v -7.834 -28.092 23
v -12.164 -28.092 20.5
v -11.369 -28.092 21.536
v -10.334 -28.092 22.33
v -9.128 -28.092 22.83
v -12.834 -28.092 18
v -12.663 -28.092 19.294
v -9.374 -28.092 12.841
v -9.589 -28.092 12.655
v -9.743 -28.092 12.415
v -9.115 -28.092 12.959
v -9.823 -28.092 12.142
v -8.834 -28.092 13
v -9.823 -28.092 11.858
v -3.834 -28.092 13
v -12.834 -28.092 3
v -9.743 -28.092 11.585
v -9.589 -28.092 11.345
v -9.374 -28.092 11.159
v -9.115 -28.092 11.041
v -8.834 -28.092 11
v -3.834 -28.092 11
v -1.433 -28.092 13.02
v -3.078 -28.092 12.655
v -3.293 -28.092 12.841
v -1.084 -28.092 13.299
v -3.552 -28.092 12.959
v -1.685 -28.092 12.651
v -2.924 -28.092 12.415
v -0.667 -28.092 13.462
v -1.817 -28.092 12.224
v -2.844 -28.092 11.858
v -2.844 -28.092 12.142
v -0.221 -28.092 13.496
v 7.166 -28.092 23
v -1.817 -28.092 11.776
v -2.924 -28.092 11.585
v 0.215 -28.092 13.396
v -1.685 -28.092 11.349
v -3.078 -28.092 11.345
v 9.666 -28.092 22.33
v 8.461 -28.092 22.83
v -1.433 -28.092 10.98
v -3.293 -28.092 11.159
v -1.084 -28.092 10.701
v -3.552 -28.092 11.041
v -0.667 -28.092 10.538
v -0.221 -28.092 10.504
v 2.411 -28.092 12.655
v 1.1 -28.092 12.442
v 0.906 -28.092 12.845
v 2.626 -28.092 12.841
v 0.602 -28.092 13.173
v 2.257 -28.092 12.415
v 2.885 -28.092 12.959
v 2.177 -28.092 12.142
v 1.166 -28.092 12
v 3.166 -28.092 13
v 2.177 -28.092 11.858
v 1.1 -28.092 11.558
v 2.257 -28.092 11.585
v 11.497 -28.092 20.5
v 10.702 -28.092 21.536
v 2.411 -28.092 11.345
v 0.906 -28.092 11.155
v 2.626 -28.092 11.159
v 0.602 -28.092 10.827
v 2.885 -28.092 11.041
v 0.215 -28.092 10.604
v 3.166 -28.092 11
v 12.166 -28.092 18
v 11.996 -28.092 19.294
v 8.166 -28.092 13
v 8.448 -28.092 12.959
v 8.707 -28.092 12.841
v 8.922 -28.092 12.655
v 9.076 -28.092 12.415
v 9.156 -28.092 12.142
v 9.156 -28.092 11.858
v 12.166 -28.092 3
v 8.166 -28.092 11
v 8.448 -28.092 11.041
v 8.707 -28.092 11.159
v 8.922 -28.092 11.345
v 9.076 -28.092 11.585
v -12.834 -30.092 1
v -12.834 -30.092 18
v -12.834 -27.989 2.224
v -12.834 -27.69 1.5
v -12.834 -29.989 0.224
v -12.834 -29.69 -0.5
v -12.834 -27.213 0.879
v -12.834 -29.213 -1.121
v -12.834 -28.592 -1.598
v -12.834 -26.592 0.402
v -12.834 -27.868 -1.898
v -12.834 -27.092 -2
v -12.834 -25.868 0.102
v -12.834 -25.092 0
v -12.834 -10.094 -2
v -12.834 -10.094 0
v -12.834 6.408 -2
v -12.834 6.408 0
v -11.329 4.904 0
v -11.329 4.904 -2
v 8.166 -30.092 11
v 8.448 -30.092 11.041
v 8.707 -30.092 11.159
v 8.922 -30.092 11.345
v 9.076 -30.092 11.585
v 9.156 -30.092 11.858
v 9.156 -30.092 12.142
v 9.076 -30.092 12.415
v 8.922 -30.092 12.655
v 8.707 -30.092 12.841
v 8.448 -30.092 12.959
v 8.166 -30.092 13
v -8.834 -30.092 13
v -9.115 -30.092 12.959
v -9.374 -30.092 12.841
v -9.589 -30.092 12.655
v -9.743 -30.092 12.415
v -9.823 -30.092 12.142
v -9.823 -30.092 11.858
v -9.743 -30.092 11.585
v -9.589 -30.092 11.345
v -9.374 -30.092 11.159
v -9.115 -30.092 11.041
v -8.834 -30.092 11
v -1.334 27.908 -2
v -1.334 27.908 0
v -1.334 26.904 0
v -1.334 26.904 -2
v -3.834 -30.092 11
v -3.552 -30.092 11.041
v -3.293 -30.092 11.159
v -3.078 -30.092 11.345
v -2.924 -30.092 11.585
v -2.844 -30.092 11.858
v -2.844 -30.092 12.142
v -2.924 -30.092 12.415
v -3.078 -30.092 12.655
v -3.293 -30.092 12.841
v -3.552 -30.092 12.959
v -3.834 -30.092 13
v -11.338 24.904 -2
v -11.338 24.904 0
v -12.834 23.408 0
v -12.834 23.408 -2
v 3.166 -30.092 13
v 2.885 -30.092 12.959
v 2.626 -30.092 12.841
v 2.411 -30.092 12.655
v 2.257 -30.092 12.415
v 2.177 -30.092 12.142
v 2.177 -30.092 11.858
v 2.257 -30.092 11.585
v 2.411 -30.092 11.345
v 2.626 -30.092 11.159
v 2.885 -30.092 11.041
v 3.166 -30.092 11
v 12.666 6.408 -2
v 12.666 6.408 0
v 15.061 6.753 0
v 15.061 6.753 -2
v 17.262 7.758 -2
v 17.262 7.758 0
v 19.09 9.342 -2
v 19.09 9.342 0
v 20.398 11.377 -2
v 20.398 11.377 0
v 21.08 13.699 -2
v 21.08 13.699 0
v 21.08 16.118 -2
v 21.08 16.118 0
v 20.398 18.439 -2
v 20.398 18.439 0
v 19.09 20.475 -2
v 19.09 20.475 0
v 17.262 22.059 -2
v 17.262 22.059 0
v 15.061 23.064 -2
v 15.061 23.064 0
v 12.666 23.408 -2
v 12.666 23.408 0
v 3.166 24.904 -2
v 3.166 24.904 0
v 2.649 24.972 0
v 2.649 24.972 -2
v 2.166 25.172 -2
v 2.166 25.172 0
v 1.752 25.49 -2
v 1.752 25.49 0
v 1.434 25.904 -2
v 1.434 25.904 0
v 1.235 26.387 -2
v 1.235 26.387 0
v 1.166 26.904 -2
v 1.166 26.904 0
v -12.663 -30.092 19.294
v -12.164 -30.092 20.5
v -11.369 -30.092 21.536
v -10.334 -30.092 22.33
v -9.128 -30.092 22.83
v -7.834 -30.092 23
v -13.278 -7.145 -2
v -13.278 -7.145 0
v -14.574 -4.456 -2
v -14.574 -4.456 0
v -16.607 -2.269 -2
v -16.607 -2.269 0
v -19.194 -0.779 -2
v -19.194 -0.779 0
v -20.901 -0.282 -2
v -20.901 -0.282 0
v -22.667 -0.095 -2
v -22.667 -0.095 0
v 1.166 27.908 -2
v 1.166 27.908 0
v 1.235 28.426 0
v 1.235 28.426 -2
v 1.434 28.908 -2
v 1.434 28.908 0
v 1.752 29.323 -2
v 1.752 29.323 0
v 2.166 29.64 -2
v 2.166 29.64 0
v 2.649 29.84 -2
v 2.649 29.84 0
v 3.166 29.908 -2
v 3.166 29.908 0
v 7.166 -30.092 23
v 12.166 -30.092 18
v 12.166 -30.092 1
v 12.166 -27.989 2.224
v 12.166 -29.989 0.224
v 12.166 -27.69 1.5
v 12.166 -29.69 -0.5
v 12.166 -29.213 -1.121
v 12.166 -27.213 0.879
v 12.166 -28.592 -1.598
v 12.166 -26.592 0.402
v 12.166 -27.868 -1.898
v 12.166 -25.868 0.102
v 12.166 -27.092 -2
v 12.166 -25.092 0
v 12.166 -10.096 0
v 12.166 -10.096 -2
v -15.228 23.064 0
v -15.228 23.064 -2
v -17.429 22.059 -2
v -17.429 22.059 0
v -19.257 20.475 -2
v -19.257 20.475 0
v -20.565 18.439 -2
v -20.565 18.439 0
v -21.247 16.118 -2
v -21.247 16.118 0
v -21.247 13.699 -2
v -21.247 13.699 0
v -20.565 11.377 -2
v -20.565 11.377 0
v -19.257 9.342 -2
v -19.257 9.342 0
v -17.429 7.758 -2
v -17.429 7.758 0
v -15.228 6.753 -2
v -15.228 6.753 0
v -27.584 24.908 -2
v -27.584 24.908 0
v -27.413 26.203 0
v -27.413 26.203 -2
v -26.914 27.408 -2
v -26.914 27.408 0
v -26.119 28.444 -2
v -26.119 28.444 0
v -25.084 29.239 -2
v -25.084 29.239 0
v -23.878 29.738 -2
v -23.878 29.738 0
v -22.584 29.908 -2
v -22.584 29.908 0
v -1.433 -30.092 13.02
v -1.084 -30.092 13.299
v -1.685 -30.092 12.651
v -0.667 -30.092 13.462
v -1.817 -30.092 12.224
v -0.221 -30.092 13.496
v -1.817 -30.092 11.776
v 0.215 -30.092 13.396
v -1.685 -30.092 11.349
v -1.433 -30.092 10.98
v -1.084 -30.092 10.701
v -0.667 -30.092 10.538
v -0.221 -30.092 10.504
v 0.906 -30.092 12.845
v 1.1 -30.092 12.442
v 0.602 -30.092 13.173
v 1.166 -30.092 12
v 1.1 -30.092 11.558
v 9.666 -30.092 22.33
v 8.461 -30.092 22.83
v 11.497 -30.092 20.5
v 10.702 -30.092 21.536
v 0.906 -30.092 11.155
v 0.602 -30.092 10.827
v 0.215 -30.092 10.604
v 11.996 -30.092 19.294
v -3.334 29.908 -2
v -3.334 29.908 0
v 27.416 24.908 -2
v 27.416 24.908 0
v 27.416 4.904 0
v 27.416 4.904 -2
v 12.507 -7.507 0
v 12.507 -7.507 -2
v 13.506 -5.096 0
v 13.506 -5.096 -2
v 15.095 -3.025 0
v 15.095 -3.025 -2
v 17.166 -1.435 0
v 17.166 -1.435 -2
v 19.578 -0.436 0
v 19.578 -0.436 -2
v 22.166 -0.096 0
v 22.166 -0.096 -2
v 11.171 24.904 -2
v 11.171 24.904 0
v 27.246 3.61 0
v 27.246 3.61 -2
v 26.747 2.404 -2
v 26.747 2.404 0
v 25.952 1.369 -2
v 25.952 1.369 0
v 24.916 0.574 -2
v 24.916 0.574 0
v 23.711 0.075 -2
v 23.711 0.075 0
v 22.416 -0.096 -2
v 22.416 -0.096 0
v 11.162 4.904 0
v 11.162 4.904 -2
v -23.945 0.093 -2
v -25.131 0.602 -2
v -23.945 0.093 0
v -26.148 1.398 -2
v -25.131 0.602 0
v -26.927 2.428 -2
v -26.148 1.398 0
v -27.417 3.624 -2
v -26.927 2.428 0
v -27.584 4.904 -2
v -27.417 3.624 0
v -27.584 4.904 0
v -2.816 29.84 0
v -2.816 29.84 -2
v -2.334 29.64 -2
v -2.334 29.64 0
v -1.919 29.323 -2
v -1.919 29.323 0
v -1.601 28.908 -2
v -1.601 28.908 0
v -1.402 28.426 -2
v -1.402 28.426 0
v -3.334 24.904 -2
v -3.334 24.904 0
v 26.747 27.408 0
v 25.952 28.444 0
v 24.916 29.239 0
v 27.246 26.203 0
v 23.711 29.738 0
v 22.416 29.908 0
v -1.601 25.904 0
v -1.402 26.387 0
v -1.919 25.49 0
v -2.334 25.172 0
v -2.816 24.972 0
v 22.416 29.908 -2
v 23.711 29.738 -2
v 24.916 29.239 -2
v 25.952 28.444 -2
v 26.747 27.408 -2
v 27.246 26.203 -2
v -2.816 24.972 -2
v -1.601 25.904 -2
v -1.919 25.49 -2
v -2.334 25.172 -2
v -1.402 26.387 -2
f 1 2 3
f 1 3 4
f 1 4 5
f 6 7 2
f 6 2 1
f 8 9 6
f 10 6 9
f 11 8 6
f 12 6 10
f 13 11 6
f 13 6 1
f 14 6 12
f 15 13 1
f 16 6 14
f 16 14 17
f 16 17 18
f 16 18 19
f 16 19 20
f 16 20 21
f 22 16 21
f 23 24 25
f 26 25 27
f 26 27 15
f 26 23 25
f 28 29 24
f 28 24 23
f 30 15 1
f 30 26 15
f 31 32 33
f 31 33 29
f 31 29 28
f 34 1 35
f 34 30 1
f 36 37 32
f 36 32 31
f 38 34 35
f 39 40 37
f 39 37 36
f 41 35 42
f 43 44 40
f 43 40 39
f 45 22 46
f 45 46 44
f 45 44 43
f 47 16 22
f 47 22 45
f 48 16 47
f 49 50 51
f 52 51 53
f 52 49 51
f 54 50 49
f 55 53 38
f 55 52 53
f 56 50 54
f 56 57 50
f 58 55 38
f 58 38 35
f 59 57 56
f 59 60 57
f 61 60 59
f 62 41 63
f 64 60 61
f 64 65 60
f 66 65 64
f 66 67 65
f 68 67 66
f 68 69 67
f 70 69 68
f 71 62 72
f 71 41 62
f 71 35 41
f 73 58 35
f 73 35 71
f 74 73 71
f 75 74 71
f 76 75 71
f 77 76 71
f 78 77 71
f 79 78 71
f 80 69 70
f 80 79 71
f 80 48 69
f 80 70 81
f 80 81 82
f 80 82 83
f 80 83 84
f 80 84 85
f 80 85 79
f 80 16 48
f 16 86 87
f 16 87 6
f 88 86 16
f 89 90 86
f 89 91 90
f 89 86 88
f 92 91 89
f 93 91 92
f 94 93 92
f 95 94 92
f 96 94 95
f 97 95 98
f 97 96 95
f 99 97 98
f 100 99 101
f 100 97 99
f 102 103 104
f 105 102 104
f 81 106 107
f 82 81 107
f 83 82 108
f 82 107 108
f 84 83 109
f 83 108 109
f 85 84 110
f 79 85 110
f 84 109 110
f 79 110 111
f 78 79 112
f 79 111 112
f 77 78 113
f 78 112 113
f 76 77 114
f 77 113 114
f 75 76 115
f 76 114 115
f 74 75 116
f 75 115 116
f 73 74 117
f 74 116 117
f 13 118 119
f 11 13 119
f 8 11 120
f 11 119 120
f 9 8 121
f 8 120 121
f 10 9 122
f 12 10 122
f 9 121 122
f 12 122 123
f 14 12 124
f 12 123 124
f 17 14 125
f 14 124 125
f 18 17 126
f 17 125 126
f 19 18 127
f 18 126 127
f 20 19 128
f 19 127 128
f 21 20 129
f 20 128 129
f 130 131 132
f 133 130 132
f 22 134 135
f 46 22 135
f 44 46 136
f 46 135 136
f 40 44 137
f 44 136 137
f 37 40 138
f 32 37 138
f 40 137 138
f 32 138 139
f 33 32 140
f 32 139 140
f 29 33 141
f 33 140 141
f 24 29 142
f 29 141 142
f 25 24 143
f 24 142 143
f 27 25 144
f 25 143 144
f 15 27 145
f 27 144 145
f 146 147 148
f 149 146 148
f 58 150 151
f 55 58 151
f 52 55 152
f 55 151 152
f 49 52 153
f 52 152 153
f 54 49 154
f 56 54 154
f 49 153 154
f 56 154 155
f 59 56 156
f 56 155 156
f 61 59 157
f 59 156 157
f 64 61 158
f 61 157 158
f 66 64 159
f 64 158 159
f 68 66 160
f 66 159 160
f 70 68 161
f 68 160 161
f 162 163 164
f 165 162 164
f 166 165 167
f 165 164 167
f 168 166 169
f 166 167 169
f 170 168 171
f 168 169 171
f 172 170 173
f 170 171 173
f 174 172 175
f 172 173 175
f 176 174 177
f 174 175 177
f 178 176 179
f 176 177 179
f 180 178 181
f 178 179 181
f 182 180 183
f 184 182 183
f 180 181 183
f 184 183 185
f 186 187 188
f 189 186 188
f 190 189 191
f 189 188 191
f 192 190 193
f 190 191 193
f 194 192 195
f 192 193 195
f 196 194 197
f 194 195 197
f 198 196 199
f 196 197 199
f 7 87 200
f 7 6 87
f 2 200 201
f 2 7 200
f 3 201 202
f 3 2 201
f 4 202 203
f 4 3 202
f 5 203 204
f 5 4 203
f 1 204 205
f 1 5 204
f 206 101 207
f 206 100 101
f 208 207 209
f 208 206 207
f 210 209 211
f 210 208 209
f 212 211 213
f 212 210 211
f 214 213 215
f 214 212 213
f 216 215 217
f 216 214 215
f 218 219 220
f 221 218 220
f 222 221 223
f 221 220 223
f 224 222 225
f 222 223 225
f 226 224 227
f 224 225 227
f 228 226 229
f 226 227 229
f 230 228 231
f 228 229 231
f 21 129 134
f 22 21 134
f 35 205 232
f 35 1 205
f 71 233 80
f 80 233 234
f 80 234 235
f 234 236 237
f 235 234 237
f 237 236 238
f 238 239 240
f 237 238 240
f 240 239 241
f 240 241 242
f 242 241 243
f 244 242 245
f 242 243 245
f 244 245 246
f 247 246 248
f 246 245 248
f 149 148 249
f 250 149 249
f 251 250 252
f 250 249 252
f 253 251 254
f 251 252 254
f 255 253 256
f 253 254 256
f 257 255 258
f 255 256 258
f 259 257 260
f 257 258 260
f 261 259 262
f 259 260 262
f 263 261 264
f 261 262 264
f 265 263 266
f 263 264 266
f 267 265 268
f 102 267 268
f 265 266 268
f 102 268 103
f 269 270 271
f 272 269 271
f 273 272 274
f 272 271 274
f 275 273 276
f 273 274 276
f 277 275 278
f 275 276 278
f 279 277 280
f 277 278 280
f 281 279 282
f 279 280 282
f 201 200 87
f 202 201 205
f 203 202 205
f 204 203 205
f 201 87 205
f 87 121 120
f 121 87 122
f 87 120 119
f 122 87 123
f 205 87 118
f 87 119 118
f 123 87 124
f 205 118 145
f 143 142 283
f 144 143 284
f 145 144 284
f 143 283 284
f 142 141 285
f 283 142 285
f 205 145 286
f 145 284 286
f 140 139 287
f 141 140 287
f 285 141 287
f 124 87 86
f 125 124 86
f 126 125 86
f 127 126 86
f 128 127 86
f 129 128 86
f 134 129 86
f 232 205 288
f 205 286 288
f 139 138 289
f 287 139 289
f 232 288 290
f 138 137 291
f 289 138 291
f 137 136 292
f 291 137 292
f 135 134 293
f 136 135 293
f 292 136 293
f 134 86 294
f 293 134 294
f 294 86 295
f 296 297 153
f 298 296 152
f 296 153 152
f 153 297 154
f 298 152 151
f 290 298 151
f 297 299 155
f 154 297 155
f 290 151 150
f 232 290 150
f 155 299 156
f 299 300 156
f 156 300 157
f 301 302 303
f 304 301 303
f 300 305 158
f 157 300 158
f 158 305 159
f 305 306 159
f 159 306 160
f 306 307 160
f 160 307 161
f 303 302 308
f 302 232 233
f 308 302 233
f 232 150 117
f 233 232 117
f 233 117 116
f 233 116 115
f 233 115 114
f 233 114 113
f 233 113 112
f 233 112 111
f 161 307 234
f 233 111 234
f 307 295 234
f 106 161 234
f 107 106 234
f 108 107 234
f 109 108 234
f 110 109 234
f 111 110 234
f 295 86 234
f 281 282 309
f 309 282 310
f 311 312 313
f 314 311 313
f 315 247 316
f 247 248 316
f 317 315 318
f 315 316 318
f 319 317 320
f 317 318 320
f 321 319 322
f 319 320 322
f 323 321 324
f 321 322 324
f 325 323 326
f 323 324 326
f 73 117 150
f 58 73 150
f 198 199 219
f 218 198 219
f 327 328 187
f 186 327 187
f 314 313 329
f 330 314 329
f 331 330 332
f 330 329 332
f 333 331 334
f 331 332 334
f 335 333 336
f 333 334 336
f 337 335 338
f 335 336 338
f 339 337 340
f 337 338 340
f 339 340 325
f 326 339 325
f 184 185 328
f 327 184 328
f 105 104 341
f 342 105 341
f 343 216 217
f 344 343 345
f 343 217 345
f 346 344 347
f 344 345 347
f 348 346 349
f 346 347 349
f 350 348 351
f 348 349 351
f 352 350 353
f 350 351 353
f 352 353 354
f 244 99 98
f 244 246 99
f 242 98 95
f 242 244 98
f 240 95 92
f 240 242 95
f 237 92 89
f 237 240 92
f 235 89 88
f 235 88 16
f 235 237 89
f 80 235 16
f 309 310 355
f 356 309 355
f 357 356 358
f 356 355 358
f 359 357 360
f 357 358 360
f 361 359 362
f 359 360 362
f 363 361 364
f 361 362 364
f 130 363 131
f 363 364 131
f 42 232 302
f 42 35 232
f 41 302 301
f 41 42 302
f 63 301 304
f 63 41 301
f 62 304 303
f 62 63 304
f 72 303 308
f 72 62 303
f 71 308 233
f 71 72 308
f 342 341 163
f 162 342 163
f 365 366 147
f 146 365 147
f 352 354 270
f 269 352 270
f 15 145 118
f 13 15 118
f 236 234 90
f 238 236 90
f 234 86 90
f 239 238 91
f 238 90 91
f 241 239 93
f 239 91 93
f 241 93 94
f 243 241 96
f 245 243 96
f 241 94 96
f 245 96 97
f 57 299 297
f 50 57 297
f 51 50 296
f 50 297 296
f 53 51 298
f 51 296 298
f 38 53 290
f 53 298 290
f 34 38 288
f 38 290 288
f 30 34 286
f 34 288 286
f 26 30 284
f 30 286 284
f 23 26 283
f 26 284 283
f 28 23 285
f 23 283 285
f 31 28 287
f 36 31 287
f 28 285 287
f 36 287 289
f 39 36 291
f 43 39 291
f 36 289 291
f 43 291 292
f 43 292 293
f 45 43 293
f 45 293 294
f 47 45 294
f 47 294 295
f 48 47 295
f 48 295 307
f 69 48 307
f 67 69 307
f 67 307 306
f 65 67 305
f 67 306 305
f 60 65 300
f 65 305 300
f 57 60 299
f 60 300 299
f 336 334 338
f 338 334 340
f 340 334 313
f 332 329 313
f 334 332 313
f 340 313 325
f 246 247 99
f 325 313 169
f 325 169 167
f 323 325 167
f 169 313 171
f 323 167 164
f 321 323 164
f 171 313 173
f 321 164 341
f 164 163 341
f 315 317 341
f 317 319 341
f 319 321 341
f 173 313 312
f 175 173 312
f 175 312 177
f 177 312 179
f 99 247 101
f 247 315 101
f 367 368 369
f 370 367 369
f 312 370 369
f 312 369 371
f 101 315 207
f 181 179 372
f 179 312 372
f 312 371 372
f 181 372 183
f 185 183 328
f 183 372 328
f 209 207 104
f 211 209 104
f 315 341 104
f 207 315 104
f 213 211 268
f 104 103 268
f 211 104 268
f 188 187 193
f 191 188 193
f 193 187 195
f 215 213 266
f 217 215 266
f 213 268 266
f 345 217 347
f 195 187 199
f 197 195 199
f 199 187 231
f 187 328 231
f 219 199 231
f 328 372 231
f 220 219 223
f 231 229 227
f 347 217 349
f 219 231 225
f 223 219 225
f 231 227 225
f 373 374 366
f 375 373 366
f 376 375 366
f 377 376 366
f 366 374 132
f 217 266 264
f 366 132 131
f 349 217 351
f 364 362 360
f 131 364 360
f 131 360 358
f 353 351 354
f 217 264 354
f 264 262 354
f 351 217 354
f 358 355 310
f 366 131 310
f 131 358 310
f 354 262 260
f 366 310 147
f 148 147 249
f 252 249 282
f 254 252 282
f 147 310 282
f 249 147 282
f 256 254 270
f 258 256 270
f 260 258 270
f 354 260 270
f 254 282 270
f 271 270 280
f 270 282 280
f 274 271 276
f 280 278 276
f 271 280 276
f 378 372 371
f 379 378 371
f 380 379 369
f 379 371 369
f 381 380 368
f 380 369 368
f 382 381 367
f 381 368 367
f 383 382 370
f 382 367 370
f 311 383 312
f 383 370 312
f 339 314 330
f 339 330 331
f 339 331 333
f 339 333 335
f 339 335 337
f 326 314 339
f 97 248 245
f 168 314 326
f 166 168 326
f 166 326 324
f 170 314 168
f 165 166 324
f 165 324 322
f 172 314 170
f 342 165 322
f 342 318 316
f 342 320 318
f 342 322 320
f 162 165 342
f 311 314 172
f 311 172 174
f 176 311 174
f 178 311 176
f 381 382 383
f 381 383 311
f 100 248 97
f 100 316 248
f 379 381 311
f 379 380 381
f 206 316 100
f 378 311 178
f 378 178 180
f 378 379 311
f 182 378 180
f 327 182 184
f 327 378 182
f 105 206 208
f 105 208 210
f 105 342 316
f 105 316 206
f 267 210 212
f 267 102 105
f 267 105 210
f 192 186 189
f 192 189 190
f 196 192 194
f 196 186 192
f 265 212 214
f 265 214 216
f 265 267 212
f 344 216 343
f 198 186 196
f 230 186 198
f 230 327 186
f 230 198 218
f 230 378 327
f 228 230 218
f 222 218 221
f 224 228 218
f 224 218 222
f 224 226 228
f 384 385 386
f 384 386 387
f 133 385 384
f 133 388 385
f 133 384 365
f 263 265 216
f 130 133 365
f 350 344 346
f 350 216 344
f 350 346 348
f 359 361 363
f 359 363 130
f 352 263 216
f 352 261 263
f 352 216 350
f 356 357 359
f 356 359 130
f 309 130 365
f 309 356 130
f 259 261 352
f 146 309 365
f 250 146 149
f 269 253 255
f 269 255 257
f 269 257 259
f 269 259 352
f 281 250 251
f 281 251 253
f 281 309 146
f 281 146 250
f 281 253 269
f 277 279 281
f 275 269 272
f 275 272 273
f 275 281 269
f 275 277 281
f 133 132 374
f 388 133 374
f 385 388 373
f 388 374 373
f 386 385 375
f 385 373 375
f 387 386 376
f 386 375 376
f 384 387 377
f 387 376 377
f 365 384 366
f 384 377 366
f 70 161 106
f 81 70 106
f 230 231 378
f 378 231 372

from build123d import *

# Parameters (mm, degrees)
BOSS_EXTRUDE1_DEPTH = 2
SKETCH2_W           = 25
SKETCH2_H           = 2
BOSS_EXTRUDE2_DEPTH = 23
FILLET1_R           = 3
FILLET2_R           = 10
FILLET3_R           = 5
SKETCH3_R           = 1.5
CUT_EXTRUDE1_DEPTH  = 2


with BuildPart() as part:
    # Sketch1 → Boss-Extrude1 (new body)
    with BuildSketch(Plane.XY):
        with BuildLine():
            Line((-1.333510856, 27.908436521), (-1.333510856, 26.904337049))
            ThreePointArc((-1.333510856, 26.904337049), (-1.919297294, 25.490123487), (-3.333510856, 24.904337049))
            Line((-3.333510856, 24.904337049), (-11.337610328, 24.904337049))
            Line((-11.337610328, 24.904337049), (-12.833510856, 23.408436521))
            ThreePointArc((-12.833510856, 23.408436521), (-21.333510856, 14.908436521), (-12.833510856, 6.408436521))
            Line((-12.833510856, 6.408436521), (-11.329411385, 4.904337049))
            Line((-11.329411385, 4.904337049), (11.162389672, 4.904337049))
            Line((11.162389672, 4.904337049), (12.666489144, 6.408436521))
            ThreePointArc((12.666489144, 6.408436521), (21.166489144, 14.908436521), (12.666489144, 23.408436521))
            Line((12.666489144, 23.408436521), (11.170588615, 24.904337049))
            Line((11.170588615, 24.904337049), (3.166489144, 24.904337049))
            ThreePointArc((3.166489144, 24.904337049), (1.752275581, 25.490123487), (1.166489144, 26.904337049))
            Line((1.166489144, 26.904337049), (1.166489144, 27.908436521))
            ThreePointArc((1.166489144, 27.908436521), (1.752275581, 29.322650083), (3.166489144, 29.908436521))
            Line((3.166489144, 29.908436521), (22.416489144, 29.908436521))
            ThreePointArc((22.416489144, 29.908436521), (25.95202305, 28.443970427), (27.416489144, 24.908436521))
            Line((27.416489144, 24.908436521), (27.416489144, 4.904337049))
            ThreePointArc((27.416489144, 4.904337049), (25.95202305, 1.368803144), (22.416489144, -0.095662951))
            Line((22.416489144, -0.095662951), (12.166489144, -0.095662951))
            Line((12.166489144, -0.095662951), (12.166489144, -30.091563479))
            Line((12.166489144, -30.091563479), (-12.833510856, -30.091563479))
            Line((-12.833510856, -30.091563479), (-12.833510856, -0.095662951))
            Line((-12.833510856, -0.095662951), (-22.583510856, -0.095662951))
            ThreePointArc((-22.583510856, -0.095662951), (-26.119044762, 1.368803144), (-27.583510856, 4.904337049))
            Line((-27.583510856, 4.904337049), (-27.583510856, 24.908436521))
            ThreePointArc((-27.583510856, 24.908436521), (-26.119044762, 28.443970427), (-22.583510856, 29.908436521))
            Line((-22.583510856, 29.908436521), (-3.333510856, 29.908436521))
            ThreePointArc((-3.333510856, 29.908436521), (-1.919297294, 29.322650083), (-1.333510856, 27.908436521))
        make_face()
    extrude(amount=-BOSS_EXTRUDE1_DEPTH)

    # Sketch2 → Boss-Extrude2 (add)
    with BuildSketch(Plane.XY):
        with Locations((-0.333510856, -29.091563479)):
            Rectangle(SKETCH2_W, SKETCH2_H)
    extrude(amount=BOSS_EXTRUDE2_DEPTH)

    # Fillet1
    fillet1_edges = [part.edges().sort_by_distance(p)[0] for p in [
        (-0.333510856, -30.091563479, -2),
        (-0.333510856, -28.091563479, 0),
    ]]
    fillet(fillet1_edges, radius=FILLET1_R)

    # Fillet2
    fillet2_edges = [part.edges().sort_by_distance(p)[0] for p in [
        (-12.833510856, -0.095662951, -1),
        (12.166489144, -0.095662951, -1),
    ]]
    fillet(fillet2_edges, radius=FILLET2_R)

    # Fillet3
    fillet3_edges = [part.edges().sort_by_distance(p)[0] for p in [
        (-12.833510856, -29.091563479, 23),
        (12.166489144, -29.091563479, 23),
    ]]
    fillet(fillet3_edges, radius=FILLET3_R)

    # Sketch3 → Cut-Extrude1 (cut)
    with BuildSketch(Plane.XZ.offset(30.091563479)):
        with Locations((-0.333510856, 12)):
            Circle(SKETCH3_R)
        with BuildLine():
            Line((3.166489144, 11), (8.166489144, 11))
            ThreePointArc((8.166489144, 11), (9.166489144, 12), (8.166489144, 13))
            Line((8.166489144, 13), (3.166489144, 13))
            ThreePointArc((3.166489144, 13), (2.166489144, 12), (3.166489144, 11))
        make_face()
        with BuildLine():
            Line((-3.833510856, 13), (-8.833510856, 13))
            ThreePointArc((-8.833510856, 13), (-9.833510856, 12), (-8.833510856, 11))
            Line((-8.833510856, 11), (-3.833510856, 11))
            ThreePointArc((-3.833510856, 11), (-2.833510856, 12), (-3.833510856, 13))
        make_face()
    extrude(amount=-CUT_EXTRUDE1_DEPTH, mode=Mode.SUBTRACT)


solid = part.part
